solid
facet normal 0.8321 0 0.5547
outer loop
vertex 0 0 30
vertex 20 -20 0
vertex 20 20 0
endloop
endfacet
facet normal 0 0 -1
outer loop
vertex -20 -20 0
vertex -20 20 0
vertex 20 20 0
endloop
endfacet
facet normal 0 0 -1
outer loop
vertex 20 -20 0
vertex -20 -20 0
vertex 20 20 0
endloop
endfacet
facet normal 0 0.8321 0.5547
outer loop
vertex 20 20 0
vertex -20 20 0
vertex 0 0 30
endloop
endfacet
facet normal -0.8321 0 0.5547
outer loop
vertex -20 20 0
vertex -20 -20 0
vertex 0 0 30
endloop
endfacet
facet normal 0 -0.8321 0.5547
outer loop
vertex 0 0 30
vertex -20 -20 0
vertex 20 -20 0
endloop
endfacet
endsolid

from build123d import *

# Parameters (mm, degrees)
F0_W     = 40
F0_H     = 40
F1_DEPTH = 30
F2_SIZE2 = 29.99999
F2_SIZE  = 19.99999


# Not quite as in the source:
# - a fillet or chamfer is up to 0.001 mm smaller than in the source, because OpenCascade refuses the exact size


with BuildPart() as f1:
    # F0 (on Top) → F1 (new body)
    with BuildSketch(Plane.XY):
        Rectangle(F0_W, F0_H)
    extrude(amount=F1_DEPTH)

    # F2 (size 20 and 30 in the source; OpenCascade refuses exactly that, so slightly less here)
    f2_edges = [f1.edges().sort_by_distance(p)[0] for p in [
        (-20, 0, 30),
        (0, 20, 30),
        (0, -20, 30),
        (20, 0, 30),
    ]]
    f2_side = f1.faces().sort_by_distance((0, 0, 30))[0]
    chamfer(f2_edges, length=F2_SIZE, length2=F2_SIZE2, reference=f2_side)


solid = f1.part
